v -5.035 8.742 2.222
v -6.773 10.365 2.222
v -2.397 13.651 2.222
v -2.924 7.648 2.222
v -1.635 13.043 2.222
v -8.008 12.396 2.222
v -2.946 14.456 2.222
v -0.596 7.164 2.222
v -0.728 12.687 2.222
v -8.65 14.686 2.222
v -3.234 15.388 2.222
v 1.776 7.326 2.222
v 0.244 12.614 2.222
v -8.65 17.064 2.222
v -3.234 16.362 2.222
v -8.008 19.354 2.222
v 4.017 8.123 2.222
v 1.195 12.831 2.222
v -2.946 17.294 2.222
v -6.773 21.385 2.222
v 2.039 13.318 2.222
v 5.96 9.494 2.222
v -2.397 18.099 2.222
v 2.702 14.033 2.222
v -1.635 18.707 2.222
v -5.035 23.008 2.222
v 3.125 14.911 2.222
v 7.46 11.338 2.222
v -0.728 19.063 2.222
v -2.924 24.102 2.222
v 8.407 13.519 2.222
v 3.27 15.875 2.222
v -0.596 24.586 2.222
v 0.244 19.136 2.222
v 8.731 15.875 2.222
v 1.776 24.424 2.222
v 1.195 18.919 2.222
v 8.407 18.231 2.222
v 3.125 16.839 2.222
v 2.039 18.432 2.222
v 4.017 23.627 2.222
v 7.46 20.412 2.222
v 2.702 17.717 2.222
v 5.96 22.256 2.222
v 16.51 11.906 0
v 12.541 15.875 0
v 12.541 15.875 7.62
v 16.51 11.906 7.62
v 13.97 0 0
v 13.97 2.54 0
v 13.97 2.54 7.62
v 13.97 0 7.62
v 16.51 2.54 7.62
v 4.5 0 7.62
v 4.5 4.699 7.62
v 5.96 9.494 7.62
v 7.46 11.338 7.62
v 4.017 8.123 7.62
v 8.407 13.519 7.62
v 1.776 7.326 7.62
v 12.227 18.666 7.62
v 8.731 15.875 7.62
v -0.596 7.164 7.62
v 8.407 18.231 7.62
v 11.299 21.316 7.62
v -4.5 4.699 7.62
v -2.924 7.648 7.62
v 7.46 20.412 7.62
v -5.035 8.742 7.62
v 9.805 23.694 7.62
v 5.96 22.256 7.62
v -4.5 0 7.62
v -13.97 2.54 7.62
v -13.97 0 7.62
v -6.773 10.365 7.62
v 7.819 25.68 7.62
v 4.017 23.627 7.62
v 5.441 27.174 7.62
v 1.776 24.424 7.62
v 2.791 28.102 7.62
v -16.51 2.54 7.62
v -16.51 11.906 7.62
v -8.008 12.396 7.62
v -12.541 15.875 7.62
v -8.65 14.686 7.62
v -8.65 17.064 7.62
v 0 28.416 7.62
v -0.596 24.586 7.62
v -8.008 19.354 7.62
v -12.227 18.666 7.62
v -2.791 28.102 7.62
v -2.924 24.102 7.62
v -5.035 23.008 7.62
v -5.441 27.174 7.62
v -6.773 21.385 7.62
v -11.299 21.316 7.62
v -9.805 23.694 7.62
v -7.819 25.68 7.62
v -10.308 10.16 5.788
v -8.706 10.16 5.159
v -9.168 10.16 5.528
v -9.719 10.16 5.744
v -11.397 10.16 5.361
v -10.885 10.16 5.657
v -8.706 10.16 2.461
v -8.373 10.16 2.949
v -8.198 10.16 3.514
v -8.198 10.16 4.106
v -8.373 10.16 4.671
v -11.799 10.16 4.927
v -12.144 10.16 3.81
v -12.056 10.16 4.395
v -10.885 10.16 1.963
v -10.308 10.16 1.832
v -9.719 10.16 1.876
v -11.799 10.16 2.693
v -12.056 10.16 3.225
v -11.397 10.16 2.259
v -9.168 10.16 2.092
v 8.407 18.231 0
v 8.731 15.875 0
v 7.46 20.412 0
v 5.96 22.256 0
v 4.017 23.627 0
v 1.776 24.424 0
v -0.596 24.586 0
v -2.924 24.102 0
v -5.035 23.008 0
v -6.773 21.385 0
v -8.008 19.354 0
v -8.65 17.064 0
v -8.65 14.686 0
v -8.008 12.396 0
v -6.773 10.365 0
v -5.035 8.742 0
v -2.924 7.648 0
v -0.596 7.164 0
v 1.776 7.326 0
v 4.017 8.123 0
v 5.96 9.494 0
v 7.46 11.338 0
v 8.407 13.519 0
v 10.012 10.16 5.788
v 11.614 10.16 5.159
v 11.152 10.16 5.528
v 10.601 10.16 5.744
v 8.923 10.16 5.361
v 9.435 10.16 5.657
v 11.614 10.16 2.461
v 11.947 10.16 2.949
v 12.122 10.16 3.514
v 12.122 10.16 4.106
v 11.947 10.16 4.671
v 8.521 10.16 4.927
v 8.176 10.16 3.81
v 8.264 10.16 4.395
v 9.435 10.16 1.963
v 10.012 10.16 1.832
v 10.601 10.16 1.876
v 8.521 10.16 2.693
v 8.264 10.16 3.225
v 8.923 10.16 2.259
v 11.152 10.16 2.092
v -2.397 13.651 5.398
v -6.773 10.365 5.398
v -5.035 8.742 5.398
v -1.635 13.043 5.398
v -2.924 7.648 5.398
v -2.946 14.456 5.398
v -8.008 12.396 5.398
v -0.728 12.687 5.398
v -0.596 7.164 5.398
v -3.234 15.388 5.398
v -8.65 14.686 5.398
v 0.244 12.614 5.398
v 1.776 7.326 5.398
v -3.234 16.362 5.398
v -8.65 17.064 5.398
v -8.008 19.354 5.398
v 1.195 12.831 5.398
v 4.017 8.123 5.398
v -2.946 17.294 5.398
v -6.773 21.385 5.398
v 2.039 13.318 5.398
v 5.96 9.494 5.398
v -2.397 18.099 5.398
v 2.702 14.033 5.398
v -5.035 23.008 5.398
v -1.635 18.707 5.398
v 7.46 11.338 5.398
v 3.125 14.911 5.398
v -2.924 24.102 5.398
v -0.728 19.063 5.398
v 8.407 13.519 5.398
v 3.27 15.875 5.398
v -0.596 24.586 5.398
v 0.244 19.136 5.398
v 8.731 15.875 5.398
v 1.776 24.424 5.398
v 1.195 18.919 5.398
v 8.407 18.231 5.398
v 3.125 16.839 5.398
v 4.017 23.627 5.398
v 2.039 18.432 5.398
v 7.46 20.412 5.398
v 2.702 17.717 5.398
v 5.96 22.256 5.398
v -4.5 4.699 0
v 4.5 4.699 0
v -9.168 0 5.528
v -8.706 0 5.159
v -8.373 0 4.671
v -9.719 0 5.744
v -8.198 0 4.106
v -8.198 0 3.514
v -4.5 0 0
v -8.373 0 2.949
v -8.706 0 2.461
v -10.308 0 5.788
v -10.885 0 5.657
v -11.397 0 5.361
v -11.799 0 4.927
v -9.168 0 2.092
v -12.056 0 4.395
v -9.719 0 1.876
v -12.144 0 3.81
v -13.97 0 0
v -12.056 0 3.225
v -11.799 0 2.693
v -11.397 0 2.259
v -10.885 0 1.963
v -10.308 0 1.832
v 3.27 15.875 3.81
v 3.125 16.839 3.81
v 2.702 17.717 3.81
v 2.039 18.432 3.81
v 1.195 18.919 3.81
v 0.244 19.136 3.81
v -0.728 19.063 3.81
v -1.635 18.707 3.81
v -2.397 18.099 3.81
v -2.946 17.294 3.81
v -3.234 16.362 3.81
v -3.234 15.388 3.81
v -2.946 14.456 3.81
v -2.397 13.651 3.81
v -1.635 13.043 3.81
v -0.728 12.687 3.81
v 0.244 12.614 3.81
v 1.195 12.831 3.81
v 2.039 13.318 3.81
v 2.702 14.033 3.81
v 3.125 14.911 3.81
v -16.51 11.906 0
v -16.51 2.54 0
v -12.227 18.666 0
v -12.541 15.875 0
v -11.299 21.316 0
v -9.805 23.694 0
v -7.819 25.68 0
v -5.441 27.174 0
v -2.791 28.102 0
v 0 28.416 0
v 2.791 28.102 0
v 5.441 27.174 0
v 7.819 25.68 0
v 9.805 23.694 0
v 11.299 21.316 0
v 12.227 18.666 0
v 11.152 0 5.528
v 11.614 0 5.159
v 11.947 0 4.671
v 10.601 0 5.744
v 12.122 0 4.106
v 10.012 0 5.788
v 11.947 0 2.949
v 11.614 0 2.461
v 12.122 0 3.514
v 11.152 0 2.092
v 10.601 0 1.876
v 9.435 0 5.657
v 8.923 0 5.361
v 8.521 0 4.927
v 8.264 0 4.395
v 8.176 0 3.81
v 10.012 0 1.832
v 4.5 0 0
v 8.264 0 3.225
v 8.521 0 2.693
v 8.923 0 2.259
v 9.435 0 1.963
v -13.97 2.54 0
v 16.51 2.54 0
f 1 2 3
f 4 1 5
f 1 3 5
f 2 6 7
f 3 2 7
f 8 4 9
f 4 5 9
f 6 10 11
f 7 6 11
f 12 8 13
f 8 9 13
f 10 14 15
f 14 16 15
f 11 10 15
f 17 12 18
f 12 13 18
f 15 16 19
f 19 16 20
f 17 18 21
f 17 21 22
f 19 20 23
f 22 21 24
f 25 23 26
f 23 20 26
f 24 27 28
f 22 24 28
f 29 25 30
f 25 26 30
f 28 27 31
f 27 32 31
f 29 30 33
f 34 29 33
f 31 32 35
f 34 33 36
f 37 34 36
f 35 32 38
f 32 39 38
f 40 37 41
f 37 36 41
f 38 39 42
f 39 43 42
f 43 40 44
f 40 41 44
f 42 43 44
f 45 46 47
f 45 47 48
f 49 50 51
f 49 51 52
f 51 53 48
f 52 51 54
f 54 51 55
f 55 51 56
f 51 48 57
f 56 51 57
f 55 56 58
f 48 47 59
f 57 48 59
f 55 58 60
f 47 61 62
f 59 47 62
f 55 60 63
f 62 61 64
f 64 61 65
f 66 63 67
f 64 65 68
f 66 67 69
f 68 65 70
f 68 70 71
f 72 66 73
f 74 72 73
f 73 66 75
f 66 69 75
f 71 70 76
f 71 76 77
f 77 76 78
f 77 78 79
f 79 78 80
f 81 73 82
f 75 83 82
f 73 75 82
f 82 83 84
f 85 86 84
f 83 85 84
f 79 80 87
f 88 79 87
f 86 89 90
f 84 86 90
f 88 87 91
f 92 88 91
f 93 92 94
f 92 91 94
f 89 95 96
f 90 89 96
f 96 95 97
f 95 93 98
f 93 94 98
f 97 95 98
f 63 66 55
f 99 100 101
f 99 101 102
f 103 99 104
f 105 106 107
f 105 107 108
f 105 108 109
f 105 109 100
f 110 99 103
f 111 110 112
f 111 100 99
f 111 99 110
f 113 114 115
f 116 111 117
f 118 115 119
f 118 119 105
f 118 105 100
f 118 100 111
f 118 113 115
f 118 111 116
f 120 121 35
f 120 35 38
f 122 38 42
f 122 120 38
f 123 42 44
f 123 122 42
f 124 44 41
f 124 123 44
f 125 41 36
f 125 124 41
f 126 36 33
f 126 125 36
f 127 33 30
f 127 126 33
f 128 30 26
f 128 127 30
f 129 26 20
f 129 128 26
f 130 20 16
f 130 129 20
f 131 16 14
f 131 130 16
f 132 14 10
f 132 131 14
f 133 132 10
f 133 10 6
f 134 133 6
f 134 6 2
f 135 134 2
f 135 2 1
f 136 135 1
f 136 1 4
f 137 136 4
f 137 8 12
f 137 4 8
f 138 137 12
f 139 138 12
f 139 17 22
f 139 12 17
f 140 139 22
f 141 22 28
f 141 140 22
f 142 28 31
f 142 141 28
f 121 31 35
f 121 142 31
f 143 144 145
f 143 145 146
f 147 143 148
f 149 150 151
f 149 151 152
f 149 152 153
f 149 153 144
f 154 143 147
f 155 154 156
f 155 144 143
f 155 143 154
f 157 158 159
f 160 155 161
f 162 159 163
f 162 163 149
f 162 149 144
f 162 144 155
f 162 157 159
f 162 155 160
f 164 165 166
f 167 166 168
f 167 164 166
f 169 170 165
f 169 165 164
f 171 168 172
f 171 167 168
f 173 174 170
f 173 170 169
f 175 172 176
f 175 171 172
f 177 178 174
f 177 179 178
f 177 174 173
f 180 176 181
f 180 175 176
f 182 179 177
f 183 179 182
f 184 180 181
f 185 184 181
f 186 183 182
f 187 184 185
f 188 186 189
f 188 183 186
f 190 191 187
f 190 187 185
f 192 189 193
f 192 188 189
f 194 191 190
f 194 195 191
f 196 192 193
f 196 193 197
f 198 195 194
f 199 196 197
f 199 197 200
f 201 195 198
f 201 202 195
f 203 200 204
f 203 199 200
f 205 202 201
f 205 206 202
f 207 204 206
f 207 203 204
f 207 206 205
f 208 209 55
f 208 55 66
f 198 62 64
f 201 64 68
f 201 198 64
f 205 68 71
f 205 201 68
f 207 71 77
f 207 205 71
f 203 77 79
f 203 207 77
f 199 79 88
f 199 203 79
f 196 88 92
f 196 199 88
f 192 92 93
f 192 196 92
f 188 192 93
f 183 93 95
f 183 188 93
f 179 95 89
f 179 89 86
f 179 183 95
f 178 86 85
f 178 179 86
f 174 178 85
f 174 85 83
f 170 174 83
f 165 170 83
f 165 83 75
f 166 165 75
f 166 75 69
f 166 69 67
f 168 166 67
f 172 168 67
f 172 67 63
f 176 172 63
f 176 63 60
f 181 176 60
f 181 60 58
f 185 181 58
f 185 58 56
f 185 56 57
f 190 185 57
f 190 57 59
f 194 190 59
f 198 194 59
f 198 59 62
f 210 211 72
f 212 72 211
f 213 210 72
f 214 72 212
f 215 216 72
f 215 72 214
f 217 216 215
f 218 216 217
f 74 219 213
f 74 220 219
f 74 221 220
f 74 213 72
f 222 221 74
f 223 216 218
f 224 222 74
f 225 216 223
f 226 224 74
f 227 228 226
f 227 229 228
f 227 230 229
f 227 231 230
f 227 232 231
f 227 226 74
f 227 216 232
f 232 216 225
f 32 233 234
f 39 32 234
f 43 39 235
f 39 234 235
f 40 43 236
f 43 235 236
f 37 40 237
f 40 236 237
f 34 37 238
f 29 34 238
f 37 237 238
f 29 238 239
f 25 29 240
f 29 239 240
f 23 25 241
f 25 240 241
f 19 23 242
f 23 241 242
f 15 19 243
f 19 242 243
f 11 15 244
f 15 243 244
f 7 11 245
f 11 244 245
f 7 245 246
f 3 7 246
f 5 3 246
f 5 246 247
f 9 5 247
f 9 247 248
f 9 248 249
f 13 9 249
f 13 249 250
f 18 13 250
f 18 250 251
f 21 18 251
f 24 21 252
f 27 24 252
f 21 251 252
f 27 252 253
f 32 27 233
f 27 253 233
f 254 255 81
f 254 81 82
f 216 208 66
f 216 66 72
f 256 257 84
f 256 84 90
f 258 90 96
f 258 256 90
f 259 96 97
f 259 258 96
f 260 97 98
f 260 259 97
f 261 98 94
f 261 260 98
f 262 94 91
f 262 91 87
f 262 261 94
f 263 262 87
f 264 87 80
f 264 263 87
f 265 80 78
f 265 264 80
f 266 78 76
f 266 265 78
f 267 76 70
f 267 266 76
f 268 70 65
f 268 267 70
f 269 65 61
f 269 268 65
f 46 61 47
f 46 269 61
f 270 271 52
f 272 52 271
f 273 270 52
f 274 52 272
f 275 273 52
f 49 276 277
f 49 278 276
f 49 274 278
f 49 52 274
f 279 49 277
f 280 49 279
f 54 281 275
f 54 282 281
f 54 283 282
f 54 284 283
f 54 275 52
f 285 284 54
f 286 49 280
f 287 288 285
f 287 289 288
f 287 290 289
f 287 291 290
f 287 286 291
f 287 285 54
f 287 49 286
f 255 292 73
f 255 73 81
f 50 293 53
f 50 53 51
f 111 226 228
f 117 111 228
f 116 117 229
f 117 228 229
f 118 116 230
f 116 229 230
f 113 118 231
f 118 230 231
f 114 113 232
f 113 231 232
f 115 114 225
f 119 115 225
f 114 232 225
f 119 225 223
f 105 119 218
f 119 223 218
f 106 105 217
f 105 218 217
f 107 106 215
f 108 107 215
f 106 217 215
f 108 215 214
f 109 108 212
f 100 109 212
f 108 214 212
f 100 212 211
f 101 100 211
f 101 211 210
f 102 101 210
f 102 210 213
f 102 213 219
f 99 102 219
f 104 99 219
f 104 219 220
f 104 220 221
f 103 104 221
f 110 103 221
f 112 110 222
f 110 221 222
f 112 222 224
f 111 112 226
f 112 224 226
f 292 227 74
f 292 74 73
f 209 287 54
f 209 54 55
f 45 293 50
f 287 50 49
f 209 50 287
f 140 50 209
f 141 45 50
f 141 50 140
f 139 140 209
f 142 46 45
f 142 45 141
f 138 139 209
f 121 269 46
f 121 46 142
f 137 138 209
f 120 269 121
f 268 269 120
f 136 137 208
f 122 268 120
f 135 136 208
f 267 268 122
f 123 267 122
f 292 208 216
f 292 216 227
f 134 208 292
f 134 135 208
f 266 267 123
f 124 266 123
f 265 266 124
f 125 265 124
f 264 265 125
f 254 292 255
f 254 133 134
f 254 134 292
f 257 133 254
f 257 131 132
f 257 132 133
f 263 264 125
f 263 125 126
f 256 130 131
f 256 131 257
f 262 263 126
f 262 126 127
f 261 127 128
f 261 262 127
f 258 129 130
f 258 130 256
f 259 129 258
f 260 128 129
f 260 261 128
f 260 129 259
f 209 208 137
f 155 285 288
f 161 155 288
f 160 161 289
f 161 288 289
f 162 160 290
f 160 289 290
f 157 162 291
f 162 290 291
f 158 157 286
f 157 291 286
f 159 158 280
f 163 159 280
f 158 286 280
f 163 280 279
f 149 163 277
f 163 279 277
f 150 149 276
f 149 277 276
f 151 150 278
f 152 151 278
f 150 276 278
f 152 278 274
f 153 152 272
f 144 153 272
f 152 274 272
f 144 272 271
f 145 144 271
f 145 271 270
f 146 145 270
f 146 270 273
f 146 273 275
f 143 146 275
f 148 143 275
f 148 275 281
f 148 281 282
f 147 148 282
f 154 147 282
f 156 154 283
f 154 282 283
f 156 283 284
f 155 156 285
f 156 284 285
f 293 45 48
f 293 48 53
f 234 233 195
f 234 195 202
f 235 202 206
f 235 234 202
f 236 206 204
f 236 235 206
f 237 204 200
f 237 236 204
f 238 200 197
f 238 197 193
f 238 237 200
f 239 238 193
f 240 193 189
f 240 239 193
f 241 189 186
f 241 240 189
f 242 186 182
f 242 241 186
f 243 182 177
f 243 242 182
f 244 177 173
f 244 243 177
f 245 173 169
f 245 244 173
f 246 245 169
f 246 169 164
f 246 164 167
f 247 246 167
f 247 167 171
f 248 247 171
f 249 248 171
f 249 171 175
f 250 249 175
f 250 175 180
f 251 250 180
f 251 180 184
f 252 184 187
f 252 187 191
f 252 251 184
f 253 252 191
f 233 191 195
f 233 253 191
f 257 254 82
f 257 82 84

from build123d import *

# Parameters (mm, degrees)
SKETCH1_R                = 8.73125
BOSS_EXTRUDE1_DEPTH      = 7.62
SKETCH3_R                = 8.7376
SKETCH3_R_2              = 3.27025
BOSS_EXTRUDE2_DEPTH      = 1.5875
BOSS_EXTRUDE2_DEPTH_BACK = 1.5875
SKETCH4_R                = 1.98374
CUT_EXTRUDE1_DEPTH       = 10.16


with BuildPart() as part:
    # Sketch1 → Boss-Extrude1 (new body)
    with BuildSketch(Plane.XY):
        with BuildLine():
            Line((4.5, 4.699), (-4.5, 4.699))
            Line((-4.5, 4.699), (-4.5, 0))
            Line((-4.5, 0), (-13.97, 0))
            Line((-13.97, 0), (-13.97, 2.54))
            Line((-13.97, 2.54), (-16.51, 2.54))
            Line((-16.51, 2.54), (-16.51, 11.90625))
            Line((-16.51, 11.90625), (-12.54125, 15.875))
            ThreePointArc((-12.54125, 15.875), (0, 28.41625), (12.54125, 15.875))
            Line((12.54125, 15.875), (16.51, 11.90625))
            Line((16.51, 11.90625), (16.51, 2.54))
            Line((16.51, 2.54), (13.97, 2.54))
            Line((13.97, 2.54), (13.97, 0))
            Line((13.97, 0), (4.5, 0))
            Line((4.5, 0), (4.5, 4.699))
        make_face()
        with Locations((0, 15.875)):
            Circle(SKETCH1_R, mode=Mode.SUBTRACT)
    extrude(amount=BOSS_EXTRUDE1_DEPTH)

    # Sketch3 → Boss-Extrude2 (add, two sides)
    with BuildSketch(Plane.XY.offset(3.81)) as boss_extrude2_sk:
        with Locations((0, 15.875)):
            Circle(SKETCH3_R)
        with Locations((0, 15.875)):
            Circle(SKETCH3_R_2, mode=Mode.SUBTRACT)
    extrude(amount=BOSS_EXTRUDE2_DEPTH)
    extrude(boss_extrude2_sk.sketch, amount=-BOSS_EXTRUDE2_DEPTH_BACK)

    # Sketch4 → Cut-Extrude1 (cut)
    with BuildSketch(Plane(origin=(0, 0, 0), x_dir=(-1, 0, 0), z_dir=(0, -1, 0))):
        with Locations((-10.16, -3.81)):
            Circle(SKETCH4_R)
        with Locations((10.16, -3.81)):
            Circle(SKETCH4_R)
    extrude(amount=-CUT_EXTRUDE1_DEPTH, mode=Mode.SUBTRACT)


solid = part.part
